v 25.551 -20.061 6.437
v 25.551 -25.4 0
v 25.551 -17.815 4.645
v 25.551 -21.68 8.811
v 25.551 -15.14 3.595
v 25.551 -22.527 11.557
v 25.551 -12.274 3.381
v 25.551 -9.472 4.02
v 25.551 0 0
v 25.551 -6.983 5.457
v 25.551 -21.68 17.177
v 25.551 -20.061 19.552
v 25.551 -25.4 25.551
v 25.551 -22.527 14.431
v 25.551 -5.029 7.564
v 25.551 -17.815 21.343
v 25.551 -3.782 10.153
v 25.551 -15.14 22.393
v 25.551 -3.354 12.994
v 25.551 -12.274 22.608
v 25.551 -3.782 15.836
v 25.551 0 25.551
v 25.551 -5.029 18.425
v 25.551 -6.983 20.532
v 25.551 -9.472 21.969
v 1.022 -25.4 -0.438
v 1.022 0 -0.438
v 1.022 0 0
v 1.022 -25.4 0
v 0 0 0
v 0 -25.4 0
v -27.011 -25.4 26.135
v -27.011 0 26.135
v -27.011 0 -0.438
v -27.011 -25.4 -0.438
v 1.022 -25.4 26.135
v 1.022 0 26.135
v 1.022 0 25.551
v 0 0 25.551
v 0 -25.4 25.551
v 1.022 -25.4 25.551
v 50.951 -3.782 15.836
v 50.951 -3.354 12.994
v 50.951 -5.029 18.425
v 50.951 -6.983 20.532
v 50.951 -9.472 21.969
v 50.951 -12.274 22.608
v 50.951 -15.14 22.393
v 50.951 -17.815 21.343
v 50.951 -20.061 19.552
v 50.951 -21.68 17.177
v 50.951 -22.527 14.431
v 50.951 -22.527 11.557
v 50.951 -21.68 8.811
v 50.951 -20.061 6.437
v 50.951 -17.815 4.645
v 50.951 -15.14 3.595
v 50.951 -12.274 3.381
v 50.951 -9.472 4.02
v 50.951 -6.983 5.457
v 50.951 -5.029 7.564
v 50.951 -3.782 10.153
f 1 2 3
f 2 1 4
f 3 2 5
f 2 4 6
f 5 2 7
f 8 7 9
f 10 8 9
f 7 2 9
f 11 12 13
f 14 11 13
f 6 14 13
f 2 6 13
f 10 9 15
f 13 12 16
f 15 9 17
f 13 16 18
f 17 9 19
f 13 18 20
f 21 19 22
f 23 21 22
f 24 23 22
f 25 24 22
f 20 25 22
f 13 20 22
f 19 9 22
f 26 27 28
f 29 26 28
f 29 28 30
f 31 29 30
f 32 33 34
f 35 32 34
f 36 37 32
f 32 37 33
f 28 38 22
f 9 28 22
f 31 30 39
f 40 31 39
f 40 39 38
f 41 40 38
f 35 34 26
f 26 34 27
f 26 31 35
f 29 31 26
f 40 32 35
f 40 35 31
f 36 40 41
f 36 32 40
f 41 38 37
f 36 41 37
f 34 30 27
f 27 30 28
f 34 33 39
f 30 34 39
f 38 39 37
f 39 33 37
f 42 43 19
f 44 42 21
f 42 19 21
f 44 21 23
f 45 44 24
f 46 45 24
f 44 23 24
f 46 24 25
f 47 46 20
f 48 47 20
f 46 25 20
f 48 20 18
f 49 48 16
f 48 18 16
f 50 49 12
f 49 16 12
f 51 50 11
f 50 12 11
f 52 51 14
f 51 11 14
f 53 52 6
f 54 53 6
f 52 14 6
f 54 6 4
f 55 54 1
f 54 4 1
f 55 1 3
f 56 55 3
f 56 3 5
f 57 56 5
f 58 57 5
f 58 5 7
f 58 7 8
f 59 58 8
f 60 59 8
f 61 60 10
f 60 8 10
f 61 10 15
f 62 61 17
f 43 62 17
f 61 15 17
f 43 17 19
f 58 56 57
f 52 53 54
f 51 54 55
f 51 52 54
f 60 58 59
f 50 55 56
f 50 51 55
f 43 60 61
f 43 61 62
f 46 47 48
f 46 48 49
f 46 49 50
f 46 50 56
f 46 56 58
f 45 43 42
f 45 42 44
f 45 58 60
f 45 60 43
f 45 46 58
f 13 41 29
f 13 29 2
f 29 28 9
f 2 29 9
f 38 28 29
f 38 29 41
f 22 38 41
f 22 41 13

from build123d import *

# Parameters (mm, degrees)
F1_DEPTH = 25.4
F0_W     = 24.5286130812
F0_H     = 25.5506392568
F2_R     = 9.6406629259
F3_DEPTH = 25.4


with BuildPart() as f1:
    # F0 (on Front) → F1 (new body)
    with BuildSketch(Plane.XZ):
        Polygon((1.022024313, 0), (0, 0), (0, 25.5506392568), (1.022024313, 25.5506392568), (1.022024313, 26.1346530169), (-27.0106755197, 26.1346530169), (-27.0106755197, -0.4380109312), (1.022024313, -0.4380109312), align=None)
    extrude(amount=F1_DEPTH)


with BuildPart() as f1b:
    # F0 (on Front) → F1, piece 2 (new body)
    with BuildSketch(Plane.XZ):
        with Locations((13.2863308536, 12.7753196284)):
            Rectangle(F0_W, F0_H)
    extrude(amount=F1_DEPTH)

    # F2 (on face) → F3 (join)
    with BuildSketch(Plane.YZ.offset(25.5506373942)):
        with Locations((-12.9943247885, 12.9943247885)):
            Circle(F2_R)
    extrude(amount=F3_DEPTH)


solid = Compound([f1.part, f1b.part])
